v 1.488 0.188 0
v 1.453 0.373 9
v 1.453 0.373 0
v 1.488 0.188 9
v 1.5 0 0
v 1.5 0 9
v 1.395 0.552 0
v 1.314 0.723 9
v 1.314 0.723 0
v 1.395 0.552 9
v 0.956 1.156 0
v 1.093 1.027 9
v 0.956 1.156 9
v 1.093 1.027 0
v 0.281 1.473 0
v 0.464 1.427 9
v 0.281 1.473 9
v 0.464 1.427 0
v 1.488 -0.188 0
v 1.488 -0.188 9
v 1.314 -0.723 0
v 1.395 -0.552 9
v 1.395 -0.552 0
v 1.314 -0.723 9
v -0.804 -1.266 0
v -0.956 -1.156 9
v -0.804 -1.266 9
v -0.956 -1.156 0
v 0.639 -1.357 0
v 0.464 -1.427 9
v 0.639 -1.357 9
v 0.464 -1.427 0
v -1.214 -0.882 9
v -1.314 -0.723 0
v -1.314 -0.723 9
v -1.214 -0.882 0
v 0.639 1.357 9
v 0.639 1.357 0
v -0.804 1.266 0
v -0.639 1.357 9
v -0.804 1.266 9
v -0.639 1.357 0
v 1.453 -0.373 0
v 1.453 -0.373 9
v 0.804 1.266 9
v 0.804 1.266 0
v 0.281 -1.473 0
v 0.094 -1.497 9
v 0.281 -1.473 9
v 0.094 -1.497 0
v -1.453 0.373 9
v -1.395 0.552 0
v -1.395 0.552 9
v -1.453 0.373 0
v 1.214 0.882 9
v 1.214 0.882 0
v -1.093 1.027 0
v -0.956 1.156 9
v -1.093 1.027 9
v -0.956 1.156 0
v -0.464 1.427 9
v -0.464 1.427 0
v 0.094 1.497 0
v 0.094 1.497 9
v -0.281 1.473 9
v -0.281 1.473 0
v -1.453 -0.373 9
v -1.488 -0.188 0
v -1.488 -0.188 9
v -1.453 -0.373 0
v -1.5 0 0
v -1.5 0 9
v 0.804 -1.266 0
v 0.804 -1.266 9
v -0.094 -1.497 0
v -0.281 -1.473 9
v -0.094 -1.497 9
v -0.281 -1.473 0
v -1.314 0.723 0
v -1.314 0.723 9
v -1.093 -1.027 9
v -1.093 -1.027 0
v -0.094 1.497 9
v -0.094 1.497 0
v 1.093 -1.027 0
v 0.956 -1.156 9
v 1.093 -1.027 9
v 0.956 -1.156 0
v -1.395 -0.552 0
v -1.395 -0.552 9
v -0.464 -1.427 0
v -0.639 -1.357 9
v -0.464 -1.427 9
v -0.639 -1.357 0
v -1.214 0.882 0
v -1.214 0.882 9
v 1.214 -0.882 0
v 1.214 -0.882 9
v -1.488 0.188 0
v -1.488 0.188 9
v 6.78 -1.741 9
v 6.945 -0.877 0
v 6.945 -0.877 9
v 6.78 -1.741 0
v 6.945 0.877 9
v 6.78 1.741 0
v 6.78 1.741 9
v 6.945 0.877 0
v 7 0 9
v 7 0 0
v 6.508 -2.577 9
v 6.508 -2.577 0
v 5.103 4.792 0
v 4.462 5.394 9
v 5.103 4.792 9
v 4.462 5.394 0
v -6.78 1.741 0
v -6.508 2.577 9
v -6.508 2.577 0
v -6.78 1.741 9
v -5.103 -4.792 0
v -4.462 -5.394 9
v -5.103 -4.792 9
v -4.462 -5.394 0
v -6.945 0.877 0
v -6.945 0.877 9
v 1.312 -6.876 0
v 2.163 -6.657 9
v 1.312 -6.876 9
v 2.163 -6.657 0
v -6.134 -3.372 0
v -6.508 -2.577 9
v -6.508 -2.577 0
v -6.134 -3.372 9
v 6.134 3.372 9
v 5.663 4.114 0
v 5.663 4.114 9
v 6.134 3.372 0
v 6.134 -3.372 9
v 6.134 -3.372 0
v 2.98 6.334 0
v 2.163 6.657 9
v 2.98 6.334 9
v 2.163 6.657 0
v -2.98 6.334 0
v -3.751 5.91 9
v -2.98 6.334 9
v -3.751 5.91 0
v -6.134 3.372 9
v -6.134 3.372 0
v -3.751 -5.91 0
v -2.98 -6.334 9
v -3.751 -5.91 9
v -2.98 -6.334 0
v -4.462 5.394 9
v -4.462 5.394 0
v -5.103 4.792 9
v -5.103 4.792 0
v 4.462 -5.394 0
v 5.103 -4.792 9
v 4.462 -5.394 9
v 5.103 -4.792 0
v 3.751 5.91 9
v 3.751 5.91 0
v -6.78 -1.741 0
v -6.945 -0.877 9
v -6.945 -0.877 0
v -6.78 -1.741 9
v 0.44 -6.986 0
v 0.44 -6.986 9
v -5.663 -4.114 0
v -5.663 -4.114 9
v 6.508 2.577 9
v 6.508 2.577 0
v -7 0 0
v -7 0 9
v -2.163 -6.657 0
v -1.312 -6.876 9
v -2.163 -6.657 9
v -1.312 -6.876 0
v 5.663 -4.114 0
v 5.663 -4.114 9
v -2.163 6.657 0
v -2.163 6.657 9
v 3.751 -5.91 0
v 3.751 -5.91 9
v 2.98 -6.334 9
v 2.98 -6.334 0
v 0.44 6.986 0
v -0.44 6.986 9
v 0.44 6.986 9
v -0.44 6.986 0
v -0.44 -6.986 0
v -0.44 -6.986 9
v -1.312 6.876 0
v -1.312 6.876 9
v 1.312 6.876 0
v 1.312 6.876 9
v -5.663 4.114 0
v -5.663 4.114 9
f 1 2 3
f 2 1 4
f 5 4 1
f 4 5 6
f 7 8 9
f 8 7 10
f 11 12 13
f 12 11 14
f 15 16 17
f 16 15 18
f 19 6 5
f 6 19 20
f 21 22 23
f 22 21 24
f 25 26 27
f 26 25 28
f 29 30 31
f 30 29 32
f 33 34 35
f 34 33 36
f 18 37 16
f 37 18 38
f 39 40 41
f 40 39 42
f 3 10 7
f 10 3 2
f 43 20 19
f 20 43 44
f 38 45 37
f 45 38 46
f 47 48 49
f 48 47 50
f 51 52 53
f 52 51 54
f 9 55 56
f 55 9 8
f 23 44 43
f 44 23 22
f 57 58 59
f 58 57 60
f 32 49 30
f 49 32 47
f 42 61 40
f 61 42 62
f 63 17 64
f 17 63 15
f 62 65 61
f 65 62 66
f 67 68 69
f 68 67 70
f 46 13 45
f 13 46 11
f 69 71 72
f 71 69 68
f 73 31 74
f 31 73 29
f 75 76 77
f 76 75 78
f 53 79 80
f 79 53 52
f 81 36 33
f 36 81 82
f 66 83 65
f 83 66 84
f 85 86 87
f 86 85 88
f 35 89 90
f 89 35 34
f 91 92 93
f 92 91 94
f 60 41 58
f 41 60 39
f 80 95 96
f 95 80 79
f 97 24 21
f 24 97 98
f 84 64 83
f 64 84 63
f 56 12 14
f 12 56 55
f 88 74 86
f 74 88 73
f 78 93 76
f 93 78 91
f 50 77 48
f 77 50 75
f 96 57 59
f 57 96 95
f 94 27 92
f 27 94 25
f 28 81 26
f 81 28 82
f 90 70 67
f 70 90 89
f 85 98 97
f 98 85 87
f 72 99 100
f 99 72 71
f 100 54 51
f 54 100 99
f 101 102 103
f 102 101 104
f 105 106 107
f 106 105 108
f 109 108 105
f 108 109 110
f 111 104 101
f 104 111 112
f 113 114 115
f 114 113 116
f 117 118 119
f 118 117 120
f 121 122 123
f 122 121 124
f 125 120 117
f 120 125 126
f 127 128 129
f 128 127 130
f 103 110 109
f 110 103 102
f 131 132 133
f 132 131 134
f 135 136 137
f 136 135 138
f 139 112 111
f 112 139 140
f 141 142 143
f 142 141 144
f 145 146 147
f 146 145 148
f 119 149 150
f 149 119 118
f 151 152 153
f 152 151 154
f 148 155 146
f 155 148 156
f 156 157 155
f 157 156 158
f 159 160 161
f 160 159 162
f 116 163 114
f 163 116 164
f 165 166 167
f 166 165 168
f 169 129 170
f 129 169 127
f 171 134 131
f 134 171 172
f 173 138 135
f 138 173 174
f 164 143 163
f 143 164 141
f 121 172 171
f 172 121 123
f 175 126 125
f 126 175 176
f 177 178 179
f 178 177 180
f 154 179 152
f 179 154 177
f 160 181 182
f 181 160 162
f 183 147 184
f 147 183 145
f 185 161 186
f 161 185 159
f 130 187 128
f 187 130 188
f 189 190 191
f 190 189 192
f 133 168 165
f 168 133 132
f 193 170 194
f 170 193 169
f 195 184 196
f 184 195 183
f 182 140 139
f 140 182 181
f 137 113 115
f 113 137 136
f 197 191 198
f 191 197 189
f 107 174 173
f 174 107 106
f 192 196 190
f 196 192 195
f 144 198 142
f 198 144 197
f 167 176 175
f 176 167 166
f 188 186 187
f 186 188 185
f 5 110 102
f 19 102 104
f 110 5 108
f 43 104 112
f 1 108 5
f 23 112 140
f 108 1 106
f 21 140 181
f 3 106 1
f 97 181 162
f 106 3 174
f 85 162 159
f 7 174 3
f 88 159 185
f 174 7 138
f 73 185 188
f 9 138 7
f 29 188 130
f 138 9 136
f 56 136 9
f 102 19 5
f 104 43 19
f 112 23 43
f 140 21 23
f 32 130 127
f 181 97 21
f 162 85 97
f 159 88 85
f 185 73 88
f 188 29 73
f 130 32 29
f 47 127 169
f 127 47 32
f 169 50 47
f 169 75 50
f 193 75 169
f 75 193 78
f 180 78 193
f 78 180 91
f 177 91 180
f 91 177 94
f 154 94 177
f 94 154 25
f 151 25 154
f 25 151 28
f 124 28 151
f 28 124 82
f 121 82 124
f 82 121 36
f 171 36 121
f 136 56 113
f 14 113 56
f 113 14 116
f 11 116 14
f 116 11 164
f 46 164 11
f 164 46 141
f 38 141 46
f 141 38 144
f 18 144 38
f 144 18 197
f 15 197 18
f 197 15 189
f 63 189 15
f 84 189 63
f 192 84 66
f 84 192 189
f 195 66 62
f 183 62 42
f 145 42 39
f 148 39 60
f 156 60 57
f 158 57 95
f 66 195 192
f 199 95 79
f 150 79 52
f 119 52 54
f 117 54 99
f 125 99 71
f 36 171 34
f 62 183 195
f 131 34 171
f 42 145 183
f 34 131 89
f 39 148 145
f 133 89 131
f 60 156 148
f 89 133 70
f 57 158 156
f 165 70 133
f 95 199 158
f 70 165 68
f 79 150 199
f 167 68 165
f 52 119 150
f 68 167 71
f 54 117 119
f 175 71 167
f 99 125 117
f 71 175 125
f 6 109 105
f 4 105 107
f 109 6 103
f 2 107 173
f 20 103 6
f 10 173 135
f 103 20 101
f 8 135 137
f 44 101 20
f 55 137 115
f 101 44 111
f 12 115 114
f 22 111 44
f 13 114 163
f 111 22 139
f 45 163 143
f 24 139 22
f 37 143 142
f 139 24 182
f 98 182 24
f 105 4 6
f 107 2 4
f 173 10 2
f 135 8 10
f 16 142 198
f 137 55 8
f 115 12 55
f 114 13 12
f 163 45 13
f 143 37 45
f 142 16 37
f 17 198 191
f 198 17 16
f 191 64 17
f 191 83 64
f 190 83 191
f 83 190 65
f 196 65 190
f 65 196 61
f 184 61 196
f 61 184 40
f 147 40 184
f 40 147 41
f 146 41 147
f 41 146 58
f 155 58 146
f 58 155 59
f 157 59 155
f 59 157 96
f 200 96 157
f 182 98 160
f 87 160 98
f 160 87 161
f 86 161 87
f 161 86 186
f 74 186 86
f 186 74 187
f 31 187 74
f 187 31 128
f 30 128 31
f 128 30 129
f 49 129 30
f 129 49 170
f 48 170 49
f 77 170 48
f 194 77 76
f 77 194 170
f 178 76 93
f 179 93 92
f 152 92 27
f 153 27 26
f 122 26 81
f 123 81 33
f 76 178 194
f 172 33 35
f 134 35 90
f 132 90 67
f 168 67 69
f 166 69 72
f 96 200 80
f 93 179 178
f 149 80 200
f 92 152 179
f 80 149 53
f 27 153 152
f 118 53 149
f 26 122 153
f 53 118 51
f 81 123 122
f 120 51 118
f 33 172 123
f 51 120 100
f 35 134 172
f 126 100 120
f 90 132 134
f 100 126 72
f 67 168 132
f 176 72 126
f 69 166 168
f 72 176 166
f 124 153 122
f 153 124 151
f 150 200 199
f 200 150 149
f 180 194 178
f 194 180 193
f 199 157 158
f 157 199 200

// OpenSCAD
$fn = 50;


difference() {
	union() {
		cylinder(h = 9, r = 7.0000000000);
	}
	union() {
		translate(v = [0, 0, -100]) {
			cylinder(h = 200, r = 1.5000000000);
		}
		translate(v = [0, 0, -100]) {
			cylinder(h = 200, r = 1.5000000000);
		}
	}
}
